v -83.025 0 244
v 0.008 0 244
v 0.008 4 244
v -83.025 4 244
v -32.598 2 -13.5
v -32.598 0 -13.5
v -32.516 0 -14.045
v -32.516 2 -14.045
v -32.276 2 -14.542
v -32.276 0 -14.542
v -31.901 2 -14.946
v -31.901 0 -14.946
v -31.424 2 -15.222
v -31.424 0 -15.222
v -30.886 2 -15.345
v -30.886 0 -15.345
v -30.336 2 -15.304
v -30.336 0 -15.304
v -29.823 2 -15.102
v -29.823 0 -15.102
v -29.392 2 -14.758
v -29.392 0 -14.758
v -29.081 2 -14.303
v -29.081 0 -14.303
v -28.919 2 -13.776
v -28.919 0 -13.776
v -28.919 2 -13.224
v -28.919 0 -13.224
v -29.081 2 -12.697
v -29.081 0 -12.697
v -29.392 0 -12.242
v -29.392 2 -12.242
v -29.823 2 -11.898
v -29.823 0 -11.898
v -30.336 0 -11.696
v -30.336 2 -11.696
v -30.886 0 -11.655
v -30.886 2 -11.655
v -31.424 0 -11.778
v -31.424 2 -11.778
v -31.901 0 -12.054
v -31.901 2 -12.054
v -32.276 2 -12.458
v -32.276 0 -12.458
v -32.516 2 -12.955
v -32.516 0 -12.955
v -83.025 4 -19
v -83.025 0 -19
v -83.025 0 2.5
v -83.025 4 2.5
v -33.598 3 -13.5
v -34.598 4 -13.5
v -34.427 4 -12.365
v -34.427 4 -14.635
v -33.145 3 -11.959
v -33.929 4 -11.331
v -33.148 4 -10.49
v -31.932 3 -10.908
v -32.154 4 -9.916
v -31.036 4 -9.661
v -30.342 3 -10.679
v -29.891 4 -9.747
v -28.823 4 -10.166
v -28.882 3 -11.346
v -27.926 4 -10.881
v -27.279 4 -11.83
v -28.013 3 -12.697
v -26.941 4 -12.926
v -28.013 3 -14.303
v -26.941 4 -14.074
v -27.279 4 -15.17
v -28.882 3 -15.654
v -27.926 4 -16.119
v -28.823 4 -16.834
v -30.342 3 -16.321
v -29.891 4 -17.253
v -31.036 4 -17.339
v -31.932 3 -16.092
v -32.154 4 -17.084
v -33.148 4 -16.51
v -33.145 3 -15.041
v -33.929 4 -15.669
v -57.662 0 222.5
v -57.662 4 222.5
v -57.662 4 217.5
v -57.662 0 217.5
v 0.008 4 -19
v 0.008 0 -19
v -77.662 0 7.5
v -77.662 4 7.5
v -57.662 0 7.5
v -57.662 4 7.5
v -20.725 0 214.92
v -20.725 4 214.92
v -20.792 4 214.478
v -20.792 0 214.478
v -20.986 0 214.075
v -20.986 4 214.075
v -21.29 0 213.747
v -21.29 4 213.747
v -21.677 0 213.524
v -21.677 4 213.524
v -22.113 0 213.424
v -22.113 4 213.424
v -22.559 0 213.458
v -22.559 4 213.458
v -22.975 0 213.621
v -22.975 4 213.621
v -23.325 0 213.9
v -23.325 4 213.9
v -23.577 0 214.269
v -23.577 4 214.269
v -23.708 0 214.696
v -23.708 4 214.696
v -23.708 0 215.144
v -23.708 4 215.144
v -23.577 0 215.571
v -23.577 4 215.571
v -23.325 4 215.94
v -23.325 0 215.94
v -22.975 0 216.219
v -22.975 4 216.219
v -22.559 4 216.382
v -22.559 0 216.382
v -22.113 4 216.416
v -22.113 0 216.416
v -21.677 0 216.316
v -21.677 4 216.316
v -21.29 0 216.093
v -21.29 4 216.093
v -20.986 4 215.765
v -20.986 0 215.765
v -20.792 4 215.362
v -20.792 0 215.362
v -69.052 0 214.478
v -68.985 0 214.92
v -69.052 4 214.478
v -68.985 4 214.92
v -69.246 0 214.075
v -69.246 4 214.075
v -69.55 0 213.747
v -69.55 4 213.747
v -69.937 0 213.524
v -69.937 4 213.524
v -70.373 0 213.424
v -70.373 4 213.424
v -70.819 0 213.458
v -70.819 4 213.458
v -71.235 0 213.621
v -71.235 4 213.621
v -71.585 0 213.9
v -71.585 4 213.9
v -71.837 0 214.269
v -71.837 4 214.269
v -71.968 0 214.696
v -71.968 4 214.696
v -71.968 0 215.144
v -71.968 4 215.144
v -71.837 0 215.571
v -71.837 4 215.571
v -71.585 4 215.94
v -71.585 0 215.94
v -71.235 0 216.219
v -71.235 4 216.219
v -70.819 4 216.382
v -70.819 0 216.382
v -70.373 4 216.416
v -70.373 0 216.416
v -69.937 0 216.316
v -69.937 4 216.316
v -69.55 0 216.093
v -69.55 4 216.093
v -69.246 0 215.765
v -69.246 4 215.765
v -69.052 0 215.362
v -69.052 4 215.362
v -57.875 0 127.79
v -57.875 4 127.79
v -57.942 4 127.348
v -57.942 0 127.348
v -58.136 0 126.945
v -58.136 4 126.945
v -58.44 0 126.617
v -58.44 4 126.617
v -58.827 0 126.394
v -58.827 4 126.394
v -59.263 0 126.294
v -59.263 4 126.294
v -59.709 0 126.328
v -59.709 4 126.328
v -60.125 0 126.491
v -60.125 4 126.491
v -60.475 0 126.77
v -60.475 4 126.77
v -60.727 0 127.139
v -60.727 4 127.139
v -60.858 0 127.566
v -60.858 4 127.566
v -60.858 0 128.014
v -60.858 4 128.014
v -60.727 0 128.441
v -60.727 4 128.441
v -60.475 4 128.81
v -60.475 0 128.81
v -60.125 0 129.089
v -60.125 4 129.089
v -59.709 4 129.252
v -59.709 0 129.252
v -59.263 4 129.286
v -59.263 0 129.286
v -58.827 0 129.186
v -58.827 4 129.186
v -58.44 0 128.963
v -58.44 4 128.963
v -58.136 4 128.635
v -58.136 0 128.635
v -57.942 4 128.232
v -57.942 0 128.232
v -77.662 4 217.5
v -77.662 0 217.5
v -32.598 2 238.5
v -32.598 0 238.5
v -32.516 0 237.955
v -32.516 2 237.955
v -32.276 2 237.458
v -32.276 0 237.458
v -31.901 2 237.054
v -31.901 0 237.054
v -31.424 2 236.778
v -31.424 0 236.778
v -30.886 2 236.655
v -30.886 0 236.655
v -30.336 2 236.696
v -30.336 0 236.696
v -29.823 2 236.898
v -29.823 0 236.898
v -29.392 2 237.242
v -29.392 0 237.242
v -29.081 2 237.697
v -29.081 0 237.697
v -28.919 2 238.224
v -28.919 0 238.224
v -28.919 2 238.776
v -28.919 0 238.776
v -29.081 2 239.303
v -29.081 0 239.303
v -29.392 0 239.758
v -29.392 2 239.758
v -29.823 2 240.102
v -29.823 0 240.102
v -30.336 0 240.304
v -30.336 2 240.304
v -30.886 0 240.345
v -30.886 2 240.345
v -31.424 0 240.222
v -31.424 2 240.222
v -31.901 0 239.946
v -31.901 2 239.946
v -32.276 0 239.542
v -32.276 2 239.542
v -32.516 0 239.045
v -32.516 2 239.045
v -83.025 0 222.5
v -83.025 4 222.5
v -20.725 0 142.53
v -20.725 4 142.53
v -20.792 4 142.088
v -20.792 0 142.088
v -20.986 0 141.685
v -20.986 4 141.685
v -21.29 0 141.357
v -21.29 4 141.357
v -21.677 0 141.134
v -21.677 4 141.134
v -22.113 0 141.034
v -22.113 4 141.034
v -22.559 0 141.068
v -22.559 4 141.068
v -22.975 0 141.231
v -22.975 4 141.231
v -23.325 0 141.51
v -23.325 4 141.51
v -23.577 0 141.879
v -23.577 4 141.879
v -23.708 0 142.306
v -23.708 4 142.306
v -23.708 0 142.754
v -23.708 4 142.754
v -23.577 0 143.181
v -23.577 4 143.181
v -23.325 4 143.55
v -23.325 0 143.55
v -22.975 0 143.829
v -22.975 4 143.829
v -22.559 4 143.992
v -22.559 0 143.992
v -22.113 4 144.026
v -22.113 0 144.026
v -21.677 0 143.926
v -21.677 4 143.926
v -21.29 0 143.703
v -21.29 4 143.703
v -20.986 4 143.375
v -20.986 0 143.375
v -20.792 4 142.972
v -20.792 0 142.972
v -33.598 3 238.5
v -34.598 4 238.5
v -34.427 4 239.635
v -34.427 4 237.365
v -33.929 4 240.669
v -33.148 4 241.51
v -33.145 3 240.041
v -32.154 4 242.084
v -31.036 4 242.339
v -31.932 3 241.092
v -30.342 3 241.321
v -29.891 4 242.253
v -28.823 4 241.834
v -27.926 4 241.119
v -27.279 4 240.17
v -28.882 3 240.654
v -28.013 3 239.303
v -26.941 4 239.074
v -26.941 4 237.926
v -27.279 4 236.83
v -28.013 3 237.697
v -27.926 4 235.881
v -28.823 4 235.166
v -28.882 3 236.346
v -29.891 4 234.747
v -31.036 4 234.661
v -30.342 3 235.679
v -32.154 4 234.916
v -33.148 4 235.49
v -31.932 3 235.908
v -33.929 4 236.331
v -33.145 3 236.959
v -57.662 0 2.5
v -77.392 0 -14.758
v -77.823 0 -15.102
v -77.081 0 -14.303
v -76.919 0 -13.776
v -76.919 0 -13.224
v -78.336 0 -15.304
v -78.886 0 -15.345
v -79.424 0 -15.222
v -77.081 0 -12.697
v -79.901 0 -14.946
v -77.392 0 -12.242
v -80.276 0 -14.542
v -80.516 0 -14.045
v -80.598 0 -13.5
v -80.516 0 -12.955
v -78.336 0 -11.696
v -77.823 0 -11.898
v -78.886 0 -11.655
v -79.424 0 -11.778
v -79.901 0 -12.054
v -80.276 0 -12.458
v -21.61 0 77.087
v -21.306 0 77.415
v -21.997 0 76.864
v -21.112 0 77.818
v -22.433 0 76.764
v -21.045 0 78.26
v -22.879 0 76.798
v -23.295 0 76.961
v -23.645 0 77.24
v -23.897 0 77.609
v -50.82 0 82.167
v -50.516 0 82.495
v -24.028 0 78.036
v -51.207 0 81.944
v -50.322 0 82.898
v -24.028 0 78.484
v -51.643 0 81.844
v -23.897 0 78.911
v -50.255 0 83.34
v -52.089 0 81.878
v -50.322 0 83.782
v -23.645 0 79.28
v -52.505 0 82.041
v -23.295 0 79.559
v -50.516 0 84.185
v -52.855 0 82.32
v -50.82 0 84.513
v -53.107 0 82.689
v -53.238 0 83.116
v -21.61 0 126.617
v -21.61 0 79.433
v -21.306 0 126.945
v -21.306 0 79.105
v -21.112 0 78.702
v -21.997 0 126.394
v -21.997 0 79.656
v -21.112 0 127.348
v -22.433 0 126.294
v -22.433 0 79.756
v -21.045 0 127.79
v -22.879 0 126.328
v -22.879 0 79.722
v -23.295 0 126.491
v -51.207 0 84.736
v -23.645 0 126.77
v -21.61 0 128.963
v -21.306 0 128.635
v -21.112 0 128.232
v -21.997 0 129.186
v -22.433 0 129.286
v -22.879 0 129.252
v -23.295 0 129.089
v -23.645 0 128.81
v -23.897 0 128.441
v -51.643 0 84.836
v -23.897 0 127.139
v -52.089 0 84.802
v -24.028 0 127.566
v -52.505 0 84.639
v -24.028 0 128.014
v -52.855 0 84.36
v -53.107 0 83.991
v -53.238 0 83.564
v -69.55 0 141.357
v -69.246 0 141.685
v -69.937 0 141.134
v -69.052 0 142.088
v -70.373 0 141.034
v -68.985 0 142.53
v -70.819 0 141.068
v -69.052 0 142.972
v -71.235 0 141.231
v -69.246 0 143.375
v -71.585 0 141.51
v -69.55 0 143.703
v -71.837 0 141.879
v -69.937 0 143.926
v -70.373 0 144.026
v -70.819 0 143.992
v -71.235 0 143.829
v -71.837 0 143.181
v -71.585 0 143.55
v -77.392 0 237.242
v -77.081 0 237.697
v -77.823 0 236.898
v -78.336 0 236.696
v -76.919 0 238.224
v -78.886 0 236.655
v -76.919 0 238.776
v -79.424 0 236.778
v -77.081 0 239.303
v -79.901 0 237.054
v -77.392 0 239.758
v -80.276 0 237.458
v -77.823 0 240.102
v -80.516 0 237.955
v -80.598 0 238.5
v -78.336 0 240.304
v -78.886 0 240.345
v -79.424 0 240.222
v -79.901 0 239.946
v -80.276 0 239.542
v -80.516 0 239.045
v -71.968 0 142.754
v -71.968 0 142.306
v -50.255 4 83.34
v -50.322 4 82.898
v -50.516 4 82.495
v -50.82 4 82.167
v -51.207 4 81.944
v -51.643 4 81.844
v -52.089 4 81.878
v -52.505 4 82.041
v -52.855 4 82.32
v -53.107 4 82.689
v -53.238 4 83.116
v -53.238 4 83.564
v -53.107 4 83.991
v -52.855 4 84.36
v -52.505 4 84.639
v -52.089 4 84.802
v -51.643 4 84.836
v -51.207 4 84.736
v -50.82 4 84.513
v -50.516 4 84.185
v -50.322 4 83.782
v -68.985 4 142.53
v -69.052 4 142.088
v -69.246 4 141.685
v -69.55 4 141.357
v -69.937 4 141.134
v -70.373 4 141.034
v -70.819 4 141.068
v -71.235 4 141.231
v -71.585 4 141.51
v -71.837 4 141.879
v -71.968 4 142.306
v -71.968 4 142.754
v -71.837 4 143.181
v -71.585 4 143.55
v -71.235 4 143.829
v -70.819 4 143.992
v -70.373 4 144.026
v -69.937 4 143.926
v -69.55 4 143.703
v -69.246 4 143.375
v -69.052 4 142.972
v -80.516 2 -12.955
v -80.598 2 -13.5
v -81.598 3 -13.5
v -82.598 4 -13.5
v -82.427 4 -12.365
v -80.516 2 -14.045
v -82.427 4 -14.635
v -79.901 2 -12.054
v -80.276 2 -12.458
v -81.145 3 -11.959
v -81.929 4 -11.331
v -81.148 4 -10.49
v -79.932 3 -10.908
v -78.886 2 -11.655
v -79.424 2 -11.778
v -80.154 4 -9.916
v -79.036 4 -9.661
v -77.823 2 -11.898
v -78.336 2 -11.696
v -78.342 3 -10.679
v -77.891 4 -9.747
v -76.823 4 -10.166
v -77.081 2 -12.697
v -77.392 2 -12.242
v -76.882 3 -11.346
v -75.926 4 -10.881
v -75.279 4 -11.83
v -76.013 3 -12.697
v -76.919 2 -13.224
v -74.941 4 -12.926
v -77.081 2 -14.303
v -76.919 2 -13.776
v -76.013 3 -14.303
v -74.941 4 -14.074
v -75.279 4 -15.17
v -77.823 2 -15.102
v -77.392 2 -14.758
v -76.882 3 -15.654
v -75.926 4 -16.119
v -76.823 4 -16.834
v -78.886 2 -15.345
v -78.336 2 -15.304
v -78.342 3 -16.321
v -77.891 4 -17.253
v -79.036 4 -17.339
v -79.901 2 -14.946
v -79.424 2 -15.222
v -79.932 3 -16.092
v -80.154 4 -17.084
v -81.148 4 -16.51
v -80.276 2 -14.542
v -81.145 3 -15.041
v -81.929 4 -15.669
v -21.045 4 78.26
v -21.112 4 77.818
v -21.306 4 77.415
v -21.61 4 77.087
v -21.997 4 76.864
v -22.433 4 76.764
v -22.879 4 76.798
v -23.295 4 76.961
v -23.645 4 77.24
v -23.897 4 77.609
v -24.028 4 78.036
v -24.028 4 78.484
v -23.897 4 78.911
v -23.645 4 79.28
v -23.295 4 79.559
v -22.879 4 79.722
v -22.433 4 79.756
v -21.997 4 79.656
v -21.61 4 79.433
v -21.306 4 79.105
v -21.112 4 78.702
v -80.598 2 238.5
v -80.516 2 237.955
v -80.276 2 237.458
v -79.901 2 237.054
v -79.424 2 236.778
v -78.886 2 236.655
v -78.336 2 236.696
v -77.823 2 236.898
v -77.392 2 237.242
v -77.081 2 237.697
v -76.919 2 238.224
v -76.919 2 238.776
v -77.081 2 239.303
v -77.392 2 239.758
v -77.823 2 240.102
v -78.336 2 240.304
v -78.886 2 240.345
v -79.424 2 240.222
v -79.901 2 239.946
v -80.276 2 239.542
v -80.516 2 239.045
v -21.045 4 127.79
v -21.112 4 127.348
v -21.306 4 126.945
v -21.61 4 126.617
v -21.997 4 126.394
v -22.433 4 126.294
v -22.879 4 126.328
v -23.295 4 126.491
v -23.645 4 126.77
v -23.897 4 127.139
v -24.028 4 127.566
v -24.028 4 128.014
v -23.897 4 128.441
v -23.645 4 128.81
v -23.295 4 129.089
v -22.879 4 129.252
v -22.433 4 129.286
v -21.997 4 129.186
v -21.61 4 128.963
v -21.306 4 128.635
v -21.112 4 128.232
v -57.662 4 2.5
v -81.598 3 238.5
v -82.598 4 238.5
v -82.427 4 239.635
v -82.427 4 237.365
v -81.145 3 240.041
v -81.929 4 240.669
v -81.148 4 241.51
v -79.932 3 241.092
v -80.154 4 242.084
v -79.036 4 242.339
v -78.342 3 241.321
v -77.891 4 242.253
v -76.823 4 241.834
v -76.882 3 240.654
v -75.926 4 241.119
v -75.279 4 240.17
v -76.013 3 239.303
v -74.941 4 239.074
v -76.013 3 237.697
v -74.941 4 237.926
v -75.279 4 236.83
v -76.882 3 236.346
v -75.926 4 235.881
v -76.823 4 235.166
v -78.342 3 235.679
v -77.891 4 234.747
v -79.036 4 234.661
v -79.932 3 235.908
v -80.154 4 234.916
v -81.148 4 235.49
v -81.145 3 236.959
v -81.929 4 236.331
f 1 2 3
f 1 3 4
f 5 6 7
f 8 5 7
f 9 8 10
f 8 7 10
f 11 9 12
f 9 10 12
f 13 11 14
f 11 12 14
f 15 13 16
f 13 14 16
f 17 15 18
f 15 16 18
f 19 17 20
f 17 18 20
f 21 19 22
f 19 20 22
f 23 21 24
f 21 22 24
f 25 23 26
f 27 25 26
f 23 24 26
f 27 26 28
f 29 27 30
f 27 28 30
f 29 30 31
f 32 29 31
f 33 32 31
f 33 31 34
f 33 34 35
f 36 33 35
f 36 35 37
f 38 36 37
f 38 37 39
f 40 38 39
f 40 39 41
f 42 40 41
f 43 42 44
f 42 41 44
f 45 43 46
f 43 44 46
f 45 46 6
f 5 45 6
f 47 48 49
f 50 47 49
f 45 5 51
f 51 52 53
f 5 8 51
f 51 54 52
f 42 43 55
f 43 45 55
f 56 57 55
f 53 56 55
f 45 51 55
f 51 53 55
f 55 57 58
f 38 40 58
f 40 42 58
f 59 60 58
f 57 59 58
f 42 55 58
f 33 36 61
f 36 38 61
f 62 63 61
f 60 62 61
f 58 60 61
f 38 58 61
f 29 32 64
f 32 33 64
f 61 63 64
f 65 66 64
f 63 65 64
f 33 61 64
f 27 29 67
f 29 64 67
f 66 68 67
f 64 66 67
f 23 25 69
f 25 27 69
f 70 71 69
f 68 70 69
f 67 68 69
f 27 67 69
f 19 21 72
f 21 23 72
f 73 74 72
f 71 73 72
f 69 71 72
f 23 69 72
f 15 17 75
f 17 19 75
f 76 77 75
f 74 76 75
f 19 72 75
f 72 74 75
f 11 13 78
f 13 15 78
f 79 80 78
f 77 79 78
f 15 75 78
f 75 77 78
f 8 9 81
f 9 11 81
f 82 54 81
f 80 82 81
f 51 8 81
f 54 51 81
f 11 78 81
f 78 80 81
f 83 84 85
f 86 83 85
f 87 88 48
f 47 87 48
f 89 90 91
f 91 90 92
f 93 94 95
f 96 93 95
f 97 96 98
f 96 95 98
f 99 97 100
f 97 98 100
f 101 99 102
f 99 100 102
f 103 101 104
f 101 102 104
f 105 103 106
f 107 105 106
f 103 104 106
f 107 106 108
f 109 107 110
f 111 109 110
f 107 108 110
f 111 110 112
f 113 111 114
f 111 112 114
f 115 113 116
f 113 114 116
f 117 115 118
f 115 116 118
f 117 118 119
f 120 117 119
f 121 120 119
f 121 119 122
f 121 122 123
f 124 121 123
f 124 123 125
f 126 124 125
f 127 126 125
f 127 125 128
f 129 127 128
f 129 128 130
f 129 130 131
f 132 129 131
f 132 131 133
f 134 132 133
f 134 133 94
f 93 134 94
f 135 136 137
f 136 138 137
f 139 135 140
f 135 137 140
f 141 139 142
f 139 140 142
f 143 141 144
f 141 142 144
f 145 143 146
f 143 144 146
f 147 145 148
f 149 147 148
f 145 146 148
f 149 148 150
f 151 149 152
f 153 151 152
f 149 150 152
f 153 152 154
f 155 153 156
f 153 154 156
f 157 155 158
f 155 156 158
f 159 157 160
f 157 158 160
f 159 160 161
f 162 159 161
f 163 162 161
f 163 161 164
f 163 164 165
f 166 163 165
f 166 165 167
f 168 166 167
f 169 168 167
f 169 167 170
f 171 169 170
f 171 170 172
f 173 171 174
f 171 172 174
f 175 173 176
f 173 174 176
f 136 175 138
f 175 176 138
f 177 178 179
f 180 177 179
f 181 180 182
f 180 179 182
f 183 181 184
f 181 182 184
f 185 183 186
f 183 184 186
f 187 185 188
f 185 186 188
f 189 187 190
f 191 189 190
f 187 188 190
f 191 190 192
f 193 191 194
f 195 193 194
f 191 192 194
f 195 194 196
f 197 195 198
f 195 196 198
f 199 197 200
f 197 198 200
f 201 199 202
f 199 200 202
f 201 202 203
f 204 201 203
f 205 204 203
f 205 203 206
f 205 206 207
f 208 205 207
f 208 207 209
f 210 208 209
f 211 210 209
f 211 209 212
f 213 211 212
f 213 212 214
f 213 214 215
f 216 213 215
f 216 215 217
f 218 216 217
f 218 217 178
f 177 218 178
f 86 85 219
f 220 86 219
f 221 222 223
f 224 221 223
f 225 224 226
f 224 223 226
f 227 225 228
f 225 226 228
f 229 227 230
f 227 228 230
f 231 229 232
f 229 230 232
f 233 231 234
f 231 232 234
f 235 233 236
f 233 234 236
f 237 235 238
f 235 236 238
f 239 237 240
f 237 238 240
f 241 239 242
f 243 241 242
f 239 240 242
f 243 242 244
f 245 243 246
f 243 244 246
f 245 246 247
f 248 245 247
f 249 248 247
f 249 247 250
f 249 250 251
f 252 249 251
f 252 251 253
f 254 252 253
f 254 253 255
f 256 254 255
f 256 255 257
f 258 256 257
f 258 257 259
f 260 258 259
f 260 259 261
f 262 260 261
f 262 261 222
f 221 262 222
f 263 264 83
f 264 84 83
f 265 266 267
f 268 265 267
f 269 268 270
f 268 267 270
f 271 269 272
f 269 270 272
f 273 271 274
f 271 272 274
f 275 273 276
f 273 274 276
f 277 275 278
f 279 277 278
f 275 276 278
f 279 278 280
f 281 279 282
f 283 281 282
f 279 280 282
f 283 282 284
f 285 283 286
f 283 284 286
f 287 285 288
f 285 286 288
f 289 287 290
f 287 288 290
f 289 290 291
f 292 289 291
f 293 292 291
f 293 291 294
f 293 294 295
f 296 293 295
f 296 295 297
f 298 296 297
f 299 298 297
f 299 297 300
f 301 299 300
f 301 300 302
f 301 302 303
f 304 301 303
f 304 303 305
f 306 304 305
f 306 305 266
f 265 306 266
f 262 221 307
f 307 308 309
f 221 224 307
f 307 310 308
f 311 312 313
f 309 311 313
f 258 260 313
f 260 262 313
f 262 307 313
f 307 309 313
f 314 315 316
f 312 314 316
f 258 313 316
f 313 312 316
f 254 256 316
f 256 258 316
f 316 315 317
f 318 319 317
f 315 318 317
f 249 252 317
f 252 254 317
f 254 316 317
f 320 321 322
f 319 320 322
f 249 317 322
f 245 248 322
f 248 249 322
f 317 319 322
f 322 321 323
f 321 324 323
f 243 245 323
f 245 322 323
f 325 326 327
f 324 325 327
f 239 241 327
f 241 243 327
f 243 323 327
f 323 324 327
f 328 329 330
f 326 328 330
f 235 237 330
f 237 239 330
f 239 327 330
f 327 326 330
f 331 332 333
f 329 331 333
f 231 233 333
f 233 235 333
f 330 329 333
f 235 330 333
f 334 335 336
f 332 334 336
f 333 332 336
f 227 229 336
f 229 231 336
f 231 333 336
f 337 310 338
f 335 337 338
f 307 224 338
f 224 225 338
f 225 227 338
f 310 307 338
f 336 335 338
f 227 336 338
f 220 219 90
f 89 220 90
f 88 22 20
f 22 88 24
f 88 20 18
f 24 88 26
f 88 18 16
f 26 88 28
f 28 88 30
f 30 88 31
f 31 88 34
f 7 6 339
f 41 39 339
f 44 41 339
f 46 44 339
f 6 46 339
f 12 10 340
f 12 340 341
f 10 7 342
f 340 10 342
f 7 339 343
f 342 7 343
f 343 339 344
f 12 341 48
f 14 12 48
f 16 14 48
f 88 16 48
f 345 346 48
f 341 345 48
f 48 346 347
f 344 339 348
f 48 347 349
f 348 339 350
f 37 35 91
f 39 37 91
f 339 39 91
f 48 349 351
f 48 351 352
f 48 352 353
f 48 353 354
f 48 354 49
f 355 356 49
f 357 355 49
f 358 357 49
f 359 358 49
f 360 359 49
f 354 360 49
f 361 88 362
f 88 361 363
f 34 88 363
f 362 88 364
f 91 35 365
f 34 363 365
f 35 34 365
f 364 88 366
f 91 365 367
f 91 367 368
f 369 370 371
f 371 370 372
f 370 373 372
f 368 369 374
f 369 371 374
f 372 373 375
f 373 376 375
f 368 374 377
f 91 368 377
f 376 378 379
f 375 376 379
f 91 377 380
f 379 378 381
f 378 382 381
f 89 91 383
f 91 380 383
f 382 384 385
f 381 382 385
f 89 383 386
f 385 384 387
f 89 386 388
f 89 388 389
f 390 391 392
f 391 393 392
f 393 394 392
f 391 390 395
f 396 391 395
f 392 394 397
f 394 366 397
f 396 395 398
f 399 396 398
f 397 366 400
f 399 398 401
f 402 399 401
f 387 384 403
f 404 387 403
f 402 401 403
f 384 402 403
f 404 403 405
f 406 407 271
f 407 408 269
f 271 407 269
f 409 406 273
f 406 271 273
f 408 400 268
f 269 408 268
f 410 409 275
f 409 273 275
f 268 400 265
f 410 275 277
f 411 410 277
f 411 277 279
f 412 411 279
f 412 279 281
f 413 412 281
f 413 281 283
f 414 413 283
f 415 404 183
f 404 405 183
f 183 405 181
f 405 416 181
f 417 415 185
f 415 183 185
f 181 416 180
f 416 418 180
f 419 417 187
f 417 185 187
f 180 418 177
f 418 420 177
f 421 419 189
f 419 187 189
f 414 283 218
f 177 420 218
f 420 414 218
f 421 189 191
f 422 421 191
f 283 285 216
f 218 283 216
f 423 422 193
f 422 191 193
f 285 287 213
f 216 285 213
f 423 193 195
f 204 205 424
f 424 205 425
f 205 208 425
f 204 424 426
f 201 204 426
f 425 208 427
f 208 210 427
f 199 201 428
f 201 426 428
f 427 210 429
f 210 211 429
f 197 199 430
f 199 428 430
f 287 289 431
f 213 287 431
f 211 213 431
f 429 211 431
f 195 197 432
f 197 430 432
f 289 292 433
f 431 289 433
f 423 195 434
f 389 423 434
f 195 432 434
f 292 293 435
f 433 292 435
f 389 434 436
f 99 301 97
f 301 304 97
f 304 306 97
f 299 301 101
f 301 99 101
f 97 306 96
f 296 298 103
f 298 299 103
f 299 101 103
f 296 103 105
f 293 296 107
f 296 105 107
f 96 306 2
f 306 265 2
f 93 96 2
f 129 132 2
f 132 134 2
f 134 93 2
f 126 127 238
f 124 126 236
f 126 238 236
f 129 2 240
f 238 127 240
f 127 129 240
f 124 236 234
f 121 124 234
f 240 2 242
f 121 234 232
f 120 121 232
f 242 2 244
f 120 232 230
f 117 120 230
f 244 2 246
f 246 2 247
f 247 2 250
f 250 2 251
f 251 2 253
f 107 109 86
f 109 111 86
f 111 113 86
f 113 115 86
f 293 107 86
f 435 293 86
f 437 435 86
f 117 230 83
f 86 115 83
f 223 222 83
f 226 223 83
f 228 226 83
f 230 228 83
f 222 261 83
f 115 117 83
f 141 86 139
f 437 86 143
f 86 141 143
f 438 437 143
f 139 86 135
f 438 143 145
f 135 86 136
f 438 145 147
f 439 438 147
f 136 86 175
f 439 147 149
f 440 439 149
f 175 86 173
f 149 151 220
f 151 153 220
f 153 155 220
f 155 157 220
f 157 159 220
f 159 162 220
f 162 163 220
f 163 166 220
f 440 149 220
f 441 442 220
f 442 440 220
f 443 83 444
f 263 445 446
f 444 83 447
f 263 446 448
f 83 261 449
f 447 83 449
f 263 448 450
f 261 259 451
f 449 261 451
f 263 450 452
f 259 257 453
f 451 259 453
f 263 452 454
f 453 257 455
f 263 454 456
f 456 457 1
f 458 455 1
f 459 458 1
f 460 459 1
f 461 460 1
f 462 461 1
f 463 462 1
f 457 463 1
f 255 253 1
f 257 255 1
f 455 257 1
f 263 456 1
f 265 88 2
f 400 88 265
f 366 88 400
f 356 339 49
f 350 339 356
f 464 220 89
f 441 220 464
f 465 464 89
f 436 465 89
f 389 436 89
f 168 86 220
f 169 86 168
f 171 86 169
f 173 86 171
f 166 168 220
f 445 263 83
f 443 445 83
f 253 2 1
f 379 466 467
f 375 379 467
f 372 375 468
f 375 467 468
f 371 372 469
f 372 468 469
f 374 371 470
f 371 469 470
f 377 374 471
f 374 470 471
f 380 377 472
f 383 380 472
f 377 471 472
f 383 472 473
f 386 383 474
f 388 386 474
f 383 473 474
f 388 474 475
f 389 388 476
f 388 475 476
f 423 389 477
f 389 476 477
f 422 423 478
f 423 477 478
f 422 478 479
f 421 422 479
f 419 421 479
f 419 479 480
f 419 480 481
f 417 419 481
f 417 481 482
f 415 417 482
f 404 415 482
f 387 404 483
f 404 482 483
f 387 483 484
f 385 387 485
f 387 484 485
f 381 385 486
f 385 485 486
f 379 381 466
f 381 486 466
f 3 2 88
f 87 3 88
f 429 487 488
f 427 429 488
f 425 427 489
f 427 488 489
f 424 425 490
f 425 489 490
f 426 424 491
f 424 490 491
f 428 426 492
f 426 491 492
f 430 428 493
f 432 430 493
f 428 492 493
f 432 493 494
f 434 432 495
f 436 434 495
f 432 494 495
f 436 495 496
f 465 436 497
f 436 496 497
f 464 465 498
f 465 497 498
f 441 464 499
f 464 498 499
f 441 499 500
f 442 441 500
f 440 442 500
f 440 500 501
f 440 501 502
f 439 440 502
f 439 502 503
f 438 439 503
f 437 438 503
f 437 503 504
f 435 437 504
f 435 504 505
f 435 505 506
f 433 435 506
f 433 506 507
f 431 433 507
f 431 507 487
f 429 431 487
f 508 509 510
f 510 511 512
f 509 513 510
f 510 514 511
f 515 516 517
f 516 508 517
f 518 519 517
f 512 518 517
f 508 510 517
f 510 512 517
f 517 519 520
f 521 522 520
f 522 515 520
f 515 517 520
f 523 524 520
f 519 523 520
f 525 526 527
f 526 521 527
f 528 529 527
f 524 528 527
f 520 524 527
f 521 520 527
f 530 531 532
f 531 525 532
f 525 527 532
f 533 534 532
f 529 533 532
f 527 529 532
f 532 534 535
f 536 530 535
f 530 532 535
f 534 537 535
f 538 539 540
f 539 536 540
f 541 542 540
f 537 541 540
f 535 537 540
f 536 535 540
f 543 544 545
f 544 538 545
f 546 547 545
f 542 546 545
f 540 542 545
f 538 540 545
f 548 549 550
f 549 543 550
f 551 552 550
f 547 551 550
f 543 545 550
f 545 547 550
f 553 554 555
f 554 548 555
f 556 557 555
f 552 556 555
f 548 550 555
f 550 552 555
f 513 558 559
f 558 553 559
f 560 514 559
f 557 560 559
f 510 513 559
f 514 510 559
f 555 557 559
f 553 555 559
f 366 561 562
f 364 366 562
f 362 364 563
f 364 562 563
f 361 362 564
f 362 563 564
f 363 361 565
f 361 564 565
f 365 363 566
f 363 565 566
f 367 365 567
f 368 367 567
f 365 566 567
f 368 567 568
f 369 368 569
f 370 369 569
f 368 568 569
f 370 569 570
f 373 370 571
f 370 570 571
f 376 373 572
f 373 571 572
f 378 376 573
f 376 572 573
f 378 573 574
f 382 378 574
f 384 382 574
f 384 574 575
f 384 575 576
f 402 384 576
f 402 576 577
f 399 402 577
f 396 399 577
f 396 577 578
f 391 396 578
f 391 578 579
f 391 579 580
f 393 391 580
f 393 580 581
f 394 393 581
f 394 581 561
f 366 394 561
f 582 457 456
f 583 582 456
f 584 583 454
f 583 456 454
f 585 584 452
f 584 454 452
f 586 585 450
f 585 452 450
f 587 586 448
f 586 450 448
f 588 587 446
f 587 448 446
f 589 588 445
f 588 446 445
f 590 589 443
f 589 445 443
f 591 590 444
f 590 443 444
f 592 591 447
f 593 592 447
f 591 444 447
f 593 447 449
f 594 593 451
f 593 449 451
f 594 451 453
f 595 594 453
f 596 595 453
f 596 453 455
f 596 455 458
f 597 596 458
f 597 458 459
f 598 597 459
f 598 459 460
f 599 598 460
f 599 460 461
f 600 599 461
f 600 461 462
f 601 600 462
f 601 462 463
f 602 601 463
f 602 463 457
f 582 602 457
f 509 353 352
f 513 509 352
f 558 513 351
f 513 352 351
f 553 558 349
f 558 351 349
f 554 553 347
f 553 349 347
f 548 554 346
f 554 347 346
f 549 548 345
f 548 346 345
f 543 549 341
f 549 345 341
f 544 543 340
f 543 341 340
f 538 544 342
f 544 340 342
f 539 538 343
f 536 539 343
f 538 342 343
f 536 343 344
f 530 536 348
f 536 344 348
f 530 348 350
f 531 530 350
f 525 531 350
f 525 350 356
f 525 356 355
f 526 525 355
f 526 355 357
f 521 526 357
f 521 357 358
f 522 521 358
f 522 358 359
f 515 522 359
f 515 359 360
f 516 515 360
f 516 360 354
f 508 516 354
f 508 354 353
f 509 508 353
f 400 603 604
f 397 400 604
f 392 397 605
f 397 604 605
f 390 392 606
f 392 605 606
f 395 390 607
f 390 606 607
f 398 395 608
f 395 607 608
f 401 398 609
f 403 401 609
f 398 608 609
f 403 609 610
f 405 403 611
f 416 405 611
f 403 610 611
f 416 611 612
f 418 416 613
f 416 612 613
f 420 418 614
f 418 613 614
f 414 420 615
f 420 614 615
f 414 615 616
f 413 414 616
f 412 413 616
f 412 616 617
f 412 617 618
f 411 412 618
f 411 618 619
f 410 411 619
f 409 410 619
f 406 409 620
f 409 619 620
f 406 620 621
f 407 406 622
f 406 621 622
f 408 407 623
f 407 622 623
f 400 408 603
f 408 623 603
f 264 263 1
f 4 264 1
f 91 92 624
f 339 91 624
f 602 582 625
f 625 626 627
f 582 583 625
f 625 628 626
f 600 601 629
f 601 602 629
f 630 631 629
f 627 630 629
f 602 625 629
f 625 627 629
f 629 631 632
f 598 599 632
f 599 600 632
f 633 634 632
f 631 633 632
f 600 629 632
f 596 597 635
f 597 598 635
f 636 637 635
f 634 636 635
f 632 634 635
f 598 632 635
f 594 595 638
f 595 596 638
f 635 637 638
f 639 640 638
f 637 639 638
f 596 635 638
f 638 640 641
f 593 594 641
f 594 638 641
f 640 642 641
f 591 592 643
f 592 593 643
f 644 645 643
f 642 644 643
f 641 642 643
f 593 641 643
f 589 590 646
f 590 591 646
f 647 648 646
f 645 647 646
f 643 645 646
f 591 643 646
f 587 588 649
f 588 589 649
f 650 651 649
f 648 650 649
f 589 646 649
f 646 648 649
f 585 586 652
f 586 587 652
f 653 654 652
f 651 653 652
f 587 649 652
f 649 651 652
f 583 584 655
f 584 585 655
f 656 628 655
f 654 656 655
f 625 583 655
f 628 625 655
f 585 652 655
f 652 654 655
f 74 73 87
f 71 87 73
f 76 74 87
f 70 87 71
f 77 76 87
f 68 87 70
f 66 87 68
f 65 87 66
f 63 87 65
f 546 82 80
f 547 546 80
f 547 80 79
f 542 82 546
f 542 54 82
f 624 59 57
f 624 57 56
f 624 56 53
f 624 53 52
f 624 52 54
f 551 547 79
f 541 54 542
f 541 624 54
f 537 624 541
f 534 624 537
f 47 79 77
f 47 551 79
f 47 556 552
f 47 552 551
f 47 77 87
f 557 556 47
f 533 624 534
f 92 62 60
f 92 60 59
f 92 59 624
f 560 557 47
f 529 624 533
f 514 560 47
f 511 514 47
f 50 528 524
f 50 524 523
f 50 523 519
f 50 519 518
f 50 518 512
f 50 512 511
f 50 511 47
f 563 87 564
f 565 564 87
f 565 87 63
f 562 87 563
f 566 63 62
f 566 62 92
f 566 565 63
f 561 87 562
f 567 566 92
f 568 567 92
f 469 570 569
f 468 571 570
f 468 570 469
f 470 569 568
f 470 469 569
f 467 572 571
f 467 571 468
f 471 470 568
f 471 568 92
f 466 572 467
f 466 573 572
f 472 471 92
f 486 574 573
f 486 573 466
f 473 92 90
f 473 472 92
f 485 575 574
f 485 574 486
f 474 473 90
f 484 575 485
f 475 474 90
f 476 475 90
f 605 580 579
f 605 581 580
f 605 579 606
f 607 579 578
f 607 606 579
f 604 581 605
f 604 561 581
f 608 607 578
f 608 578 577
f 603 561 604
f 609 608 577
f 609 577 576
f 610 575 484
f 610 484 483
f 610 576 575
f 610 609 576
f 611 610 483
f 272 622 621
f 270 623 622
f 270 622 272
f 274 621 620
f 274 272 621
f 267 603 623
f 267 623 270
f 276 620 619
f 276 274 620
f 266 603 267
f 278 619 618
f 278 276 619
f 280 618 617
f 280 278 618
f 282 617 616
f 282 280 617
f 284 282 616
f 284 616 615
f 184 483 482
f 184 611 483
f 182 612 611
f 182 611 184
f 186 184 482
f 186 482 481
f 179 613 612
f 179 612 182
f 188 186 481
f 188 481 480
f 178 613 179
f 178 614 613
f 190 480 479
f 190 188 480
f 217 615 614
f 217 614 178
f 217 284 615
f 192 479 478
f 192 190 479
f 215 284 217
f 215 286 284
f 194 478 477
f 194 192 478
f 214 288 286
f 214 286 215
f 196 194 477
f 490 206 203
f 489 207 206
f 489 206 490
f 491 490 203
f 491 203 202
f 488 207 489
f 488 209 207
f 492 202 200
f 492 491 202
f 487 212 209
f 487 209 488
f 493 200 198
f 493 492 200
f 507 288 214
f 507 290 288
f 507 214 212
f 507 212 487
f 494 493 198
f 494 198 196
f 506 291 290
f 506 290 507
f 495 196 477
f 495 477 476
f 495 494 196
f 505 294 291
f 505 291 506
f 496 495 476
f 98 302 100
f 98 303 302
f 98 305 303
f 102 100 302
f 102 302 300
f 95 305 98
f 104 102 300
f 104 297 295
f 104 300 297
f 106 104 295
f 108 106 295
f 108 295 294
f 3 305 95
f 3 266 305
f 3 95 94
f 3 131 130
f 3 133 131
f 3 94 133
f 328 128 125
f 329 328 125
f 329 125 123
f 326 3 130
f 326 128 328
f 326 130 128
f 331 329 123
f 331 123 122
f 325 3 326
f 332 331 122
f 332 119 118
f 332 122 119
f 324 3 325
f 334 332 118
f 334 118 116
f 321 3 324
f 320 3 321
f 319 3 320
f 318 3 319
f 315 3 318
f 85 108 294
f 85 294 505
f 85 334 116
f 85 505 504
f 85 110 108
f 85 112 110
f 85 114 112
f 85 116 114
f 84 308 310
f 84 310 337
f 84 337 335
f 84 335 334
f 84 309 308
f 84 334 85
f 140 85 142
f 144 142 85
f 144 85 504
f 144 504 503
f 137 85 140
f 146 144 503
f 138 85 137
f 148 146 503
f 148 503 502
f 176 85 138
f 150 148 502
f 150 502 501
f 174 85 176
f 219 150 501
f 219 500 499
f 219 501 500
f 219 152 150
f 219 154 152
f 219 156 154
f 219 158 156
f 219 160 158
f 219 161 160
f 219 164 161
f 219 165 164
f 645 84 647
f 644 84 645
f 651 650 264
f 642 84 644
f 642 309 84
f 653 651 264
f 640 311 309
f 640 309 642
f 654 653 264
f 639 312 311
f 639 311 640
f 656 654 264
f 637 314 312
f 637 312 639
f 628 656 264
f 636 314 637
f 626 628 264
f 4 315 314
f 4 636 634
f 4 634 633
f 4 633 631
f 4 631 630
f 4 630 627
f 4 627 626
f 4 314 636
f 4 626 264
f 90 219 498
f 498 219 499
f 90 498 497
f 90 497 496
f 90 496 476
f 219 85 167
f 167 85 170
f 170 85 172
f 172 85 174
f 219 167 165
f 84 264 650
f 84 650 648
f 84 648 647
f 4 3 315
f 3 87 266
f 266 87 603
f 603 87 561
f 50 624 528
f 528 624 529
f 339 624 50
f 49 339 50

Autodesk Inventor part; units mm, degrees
ref_plane "YZ Plane" through (0, 0, 0) normal (1, 0, 0) x (0, 1, 0)
ref_plane "XZ Plane" through (0, 0, 0) normal (0, 1, 0) x (-1, 0, 0)
ref_plane "XY Plane" through (0, 0, 0) normal (0, 0, 1) x (1, 0, 0)
sketch "Эскиз1" plane through (0, 0, 0) normal (0, 1, 0) x (-1, 0, 0)
  line L0 (-2.6795, -19) -> (83.0251, -19)
  line L1 (-2.6795, 244) -> (83.0251, 244)
  circle A0 centre (30.7479, 238.5) radius 1.85
  circle A1 centre (78.7479, 238.5) radius 1.85
  circle A2 centre (78.7479, -13.5) radius 1.85
  circle A3 centre (30.7479, -13.5) radius 1.85
  line L2 (83.0251, 244) -> (-2.6795, 244)
  line L3 (-2.6795, 244) -> (-2.6795, -19)
  line L4 (-2.6795, -19) -> (83.0251, -19)
  line L5 (83.0251, -19) -> (83.0251, 244)
  point P0 (0, 0)
  point P1 (83.0251, -19)
  point P2 (-2.6795, 244)
  dimension "d7" = 5.5
  dimension "d8" = 5.5
  dimension "d9" = 4.2772
  dimension "d10" = 48
  dimension "d11" = 263
  dimension "d12" = 5.5
  dimension "d13" = 5.5
  dimension "d14" = 4.2772
  dimension "d15" = 48
extrude "Выдавливание1" add sketch "Эскиз1" along normal blind 4
thicken "Толщина1" operation add thickness 2.671 both sides no extend neighbours yes toward (-1, 0, 0) faces at (2.6795, 1.3333, 156.3333)
chamfer "Фаска1" distance 2 angle 45 4 edges at (-76.8979, 4, 238.5) (-28.8979, 4, 238.5) (-28.8979, 4, -13.5) (-76.8979, 4, -13.5)
sketch "Эскиз2" plane through (-1.399, 4, 60) normal (0, 1, 0) x (1, 0, 0)
  line L0 (-76.2625, -157.5) -> (-76.2625, 52.5)
  line L1 (-76.2625, 52.5) -> (-56.2625, 52.5)
  line L2 (-56.2625, -157.5) -> (-76.2625, -157.5)
  line L3 (-56.2625, 57.5) -> (-76.2625, 57.5)
  line L4 (-76.2625, 57.5) -> (-81.2625, 57.5)
  line L5 (-81.2625, 57.5) -> (-81.2625, -162.5)
  line L6 (-81.2625, -162.5) -> (-76.2625, -162.5)
  line L7 (-76.2625, -162.5) -> (-56.2625, -162.5)
  line L8 (-56.2625, -162.5) -> (-56.2625, -157.5)
  line L9 (-56.2625, 52.5) -> (-56.2625, 57.5)
  line L10 (1.4075, -184) -> (1.4075, 79) projected
  point P0 (0, 0)
  dimension "d21" = 57.67
  dimension "d22" = 25
  dimension "d23" = 5
extrude "Выдавливание2" cut sketch "Эскиз2" against normal blind 10
thicken "Толщина2" operation add thickness 2 both sides no extend neighbours yes toward (-1, 0, 0) faces at (-82.6615, 2.6667, 75.8333)
sketch "Эскиз3" plane through (0, 4, 0) normal (0, 1, 0) x (1, 0, 0)
  circle A0 centre (-51.7551, -83.34) radius 1.5 projected
  circle A1 centre (-22.5451, -78.26) radius 1.5 projected
  circle A2 centre (-22.5451, -127.79) radius 1.5 projected
  circle A3 centre (-59.3751, -127.79) radius 1.5 projected
  circle A4 centre (-22.2251, -142.53) radius 1.5 projected
  circle A5 centre (-70.4851, -142.53) radius 1.5 projected
  circle A6 centre (-22.2251, -214.92) radius 1.5 projected
  circle A7 centre (-70.4851, -214.92) radius 1.5 projected
  point P0 (0, 0)
extrude "Выдавливание3" cut sketch "Эскиз3" against normal blind 10
properties part number "KB33-046-004-002 - Передняя пластина" material "Дерево (вишня)"
